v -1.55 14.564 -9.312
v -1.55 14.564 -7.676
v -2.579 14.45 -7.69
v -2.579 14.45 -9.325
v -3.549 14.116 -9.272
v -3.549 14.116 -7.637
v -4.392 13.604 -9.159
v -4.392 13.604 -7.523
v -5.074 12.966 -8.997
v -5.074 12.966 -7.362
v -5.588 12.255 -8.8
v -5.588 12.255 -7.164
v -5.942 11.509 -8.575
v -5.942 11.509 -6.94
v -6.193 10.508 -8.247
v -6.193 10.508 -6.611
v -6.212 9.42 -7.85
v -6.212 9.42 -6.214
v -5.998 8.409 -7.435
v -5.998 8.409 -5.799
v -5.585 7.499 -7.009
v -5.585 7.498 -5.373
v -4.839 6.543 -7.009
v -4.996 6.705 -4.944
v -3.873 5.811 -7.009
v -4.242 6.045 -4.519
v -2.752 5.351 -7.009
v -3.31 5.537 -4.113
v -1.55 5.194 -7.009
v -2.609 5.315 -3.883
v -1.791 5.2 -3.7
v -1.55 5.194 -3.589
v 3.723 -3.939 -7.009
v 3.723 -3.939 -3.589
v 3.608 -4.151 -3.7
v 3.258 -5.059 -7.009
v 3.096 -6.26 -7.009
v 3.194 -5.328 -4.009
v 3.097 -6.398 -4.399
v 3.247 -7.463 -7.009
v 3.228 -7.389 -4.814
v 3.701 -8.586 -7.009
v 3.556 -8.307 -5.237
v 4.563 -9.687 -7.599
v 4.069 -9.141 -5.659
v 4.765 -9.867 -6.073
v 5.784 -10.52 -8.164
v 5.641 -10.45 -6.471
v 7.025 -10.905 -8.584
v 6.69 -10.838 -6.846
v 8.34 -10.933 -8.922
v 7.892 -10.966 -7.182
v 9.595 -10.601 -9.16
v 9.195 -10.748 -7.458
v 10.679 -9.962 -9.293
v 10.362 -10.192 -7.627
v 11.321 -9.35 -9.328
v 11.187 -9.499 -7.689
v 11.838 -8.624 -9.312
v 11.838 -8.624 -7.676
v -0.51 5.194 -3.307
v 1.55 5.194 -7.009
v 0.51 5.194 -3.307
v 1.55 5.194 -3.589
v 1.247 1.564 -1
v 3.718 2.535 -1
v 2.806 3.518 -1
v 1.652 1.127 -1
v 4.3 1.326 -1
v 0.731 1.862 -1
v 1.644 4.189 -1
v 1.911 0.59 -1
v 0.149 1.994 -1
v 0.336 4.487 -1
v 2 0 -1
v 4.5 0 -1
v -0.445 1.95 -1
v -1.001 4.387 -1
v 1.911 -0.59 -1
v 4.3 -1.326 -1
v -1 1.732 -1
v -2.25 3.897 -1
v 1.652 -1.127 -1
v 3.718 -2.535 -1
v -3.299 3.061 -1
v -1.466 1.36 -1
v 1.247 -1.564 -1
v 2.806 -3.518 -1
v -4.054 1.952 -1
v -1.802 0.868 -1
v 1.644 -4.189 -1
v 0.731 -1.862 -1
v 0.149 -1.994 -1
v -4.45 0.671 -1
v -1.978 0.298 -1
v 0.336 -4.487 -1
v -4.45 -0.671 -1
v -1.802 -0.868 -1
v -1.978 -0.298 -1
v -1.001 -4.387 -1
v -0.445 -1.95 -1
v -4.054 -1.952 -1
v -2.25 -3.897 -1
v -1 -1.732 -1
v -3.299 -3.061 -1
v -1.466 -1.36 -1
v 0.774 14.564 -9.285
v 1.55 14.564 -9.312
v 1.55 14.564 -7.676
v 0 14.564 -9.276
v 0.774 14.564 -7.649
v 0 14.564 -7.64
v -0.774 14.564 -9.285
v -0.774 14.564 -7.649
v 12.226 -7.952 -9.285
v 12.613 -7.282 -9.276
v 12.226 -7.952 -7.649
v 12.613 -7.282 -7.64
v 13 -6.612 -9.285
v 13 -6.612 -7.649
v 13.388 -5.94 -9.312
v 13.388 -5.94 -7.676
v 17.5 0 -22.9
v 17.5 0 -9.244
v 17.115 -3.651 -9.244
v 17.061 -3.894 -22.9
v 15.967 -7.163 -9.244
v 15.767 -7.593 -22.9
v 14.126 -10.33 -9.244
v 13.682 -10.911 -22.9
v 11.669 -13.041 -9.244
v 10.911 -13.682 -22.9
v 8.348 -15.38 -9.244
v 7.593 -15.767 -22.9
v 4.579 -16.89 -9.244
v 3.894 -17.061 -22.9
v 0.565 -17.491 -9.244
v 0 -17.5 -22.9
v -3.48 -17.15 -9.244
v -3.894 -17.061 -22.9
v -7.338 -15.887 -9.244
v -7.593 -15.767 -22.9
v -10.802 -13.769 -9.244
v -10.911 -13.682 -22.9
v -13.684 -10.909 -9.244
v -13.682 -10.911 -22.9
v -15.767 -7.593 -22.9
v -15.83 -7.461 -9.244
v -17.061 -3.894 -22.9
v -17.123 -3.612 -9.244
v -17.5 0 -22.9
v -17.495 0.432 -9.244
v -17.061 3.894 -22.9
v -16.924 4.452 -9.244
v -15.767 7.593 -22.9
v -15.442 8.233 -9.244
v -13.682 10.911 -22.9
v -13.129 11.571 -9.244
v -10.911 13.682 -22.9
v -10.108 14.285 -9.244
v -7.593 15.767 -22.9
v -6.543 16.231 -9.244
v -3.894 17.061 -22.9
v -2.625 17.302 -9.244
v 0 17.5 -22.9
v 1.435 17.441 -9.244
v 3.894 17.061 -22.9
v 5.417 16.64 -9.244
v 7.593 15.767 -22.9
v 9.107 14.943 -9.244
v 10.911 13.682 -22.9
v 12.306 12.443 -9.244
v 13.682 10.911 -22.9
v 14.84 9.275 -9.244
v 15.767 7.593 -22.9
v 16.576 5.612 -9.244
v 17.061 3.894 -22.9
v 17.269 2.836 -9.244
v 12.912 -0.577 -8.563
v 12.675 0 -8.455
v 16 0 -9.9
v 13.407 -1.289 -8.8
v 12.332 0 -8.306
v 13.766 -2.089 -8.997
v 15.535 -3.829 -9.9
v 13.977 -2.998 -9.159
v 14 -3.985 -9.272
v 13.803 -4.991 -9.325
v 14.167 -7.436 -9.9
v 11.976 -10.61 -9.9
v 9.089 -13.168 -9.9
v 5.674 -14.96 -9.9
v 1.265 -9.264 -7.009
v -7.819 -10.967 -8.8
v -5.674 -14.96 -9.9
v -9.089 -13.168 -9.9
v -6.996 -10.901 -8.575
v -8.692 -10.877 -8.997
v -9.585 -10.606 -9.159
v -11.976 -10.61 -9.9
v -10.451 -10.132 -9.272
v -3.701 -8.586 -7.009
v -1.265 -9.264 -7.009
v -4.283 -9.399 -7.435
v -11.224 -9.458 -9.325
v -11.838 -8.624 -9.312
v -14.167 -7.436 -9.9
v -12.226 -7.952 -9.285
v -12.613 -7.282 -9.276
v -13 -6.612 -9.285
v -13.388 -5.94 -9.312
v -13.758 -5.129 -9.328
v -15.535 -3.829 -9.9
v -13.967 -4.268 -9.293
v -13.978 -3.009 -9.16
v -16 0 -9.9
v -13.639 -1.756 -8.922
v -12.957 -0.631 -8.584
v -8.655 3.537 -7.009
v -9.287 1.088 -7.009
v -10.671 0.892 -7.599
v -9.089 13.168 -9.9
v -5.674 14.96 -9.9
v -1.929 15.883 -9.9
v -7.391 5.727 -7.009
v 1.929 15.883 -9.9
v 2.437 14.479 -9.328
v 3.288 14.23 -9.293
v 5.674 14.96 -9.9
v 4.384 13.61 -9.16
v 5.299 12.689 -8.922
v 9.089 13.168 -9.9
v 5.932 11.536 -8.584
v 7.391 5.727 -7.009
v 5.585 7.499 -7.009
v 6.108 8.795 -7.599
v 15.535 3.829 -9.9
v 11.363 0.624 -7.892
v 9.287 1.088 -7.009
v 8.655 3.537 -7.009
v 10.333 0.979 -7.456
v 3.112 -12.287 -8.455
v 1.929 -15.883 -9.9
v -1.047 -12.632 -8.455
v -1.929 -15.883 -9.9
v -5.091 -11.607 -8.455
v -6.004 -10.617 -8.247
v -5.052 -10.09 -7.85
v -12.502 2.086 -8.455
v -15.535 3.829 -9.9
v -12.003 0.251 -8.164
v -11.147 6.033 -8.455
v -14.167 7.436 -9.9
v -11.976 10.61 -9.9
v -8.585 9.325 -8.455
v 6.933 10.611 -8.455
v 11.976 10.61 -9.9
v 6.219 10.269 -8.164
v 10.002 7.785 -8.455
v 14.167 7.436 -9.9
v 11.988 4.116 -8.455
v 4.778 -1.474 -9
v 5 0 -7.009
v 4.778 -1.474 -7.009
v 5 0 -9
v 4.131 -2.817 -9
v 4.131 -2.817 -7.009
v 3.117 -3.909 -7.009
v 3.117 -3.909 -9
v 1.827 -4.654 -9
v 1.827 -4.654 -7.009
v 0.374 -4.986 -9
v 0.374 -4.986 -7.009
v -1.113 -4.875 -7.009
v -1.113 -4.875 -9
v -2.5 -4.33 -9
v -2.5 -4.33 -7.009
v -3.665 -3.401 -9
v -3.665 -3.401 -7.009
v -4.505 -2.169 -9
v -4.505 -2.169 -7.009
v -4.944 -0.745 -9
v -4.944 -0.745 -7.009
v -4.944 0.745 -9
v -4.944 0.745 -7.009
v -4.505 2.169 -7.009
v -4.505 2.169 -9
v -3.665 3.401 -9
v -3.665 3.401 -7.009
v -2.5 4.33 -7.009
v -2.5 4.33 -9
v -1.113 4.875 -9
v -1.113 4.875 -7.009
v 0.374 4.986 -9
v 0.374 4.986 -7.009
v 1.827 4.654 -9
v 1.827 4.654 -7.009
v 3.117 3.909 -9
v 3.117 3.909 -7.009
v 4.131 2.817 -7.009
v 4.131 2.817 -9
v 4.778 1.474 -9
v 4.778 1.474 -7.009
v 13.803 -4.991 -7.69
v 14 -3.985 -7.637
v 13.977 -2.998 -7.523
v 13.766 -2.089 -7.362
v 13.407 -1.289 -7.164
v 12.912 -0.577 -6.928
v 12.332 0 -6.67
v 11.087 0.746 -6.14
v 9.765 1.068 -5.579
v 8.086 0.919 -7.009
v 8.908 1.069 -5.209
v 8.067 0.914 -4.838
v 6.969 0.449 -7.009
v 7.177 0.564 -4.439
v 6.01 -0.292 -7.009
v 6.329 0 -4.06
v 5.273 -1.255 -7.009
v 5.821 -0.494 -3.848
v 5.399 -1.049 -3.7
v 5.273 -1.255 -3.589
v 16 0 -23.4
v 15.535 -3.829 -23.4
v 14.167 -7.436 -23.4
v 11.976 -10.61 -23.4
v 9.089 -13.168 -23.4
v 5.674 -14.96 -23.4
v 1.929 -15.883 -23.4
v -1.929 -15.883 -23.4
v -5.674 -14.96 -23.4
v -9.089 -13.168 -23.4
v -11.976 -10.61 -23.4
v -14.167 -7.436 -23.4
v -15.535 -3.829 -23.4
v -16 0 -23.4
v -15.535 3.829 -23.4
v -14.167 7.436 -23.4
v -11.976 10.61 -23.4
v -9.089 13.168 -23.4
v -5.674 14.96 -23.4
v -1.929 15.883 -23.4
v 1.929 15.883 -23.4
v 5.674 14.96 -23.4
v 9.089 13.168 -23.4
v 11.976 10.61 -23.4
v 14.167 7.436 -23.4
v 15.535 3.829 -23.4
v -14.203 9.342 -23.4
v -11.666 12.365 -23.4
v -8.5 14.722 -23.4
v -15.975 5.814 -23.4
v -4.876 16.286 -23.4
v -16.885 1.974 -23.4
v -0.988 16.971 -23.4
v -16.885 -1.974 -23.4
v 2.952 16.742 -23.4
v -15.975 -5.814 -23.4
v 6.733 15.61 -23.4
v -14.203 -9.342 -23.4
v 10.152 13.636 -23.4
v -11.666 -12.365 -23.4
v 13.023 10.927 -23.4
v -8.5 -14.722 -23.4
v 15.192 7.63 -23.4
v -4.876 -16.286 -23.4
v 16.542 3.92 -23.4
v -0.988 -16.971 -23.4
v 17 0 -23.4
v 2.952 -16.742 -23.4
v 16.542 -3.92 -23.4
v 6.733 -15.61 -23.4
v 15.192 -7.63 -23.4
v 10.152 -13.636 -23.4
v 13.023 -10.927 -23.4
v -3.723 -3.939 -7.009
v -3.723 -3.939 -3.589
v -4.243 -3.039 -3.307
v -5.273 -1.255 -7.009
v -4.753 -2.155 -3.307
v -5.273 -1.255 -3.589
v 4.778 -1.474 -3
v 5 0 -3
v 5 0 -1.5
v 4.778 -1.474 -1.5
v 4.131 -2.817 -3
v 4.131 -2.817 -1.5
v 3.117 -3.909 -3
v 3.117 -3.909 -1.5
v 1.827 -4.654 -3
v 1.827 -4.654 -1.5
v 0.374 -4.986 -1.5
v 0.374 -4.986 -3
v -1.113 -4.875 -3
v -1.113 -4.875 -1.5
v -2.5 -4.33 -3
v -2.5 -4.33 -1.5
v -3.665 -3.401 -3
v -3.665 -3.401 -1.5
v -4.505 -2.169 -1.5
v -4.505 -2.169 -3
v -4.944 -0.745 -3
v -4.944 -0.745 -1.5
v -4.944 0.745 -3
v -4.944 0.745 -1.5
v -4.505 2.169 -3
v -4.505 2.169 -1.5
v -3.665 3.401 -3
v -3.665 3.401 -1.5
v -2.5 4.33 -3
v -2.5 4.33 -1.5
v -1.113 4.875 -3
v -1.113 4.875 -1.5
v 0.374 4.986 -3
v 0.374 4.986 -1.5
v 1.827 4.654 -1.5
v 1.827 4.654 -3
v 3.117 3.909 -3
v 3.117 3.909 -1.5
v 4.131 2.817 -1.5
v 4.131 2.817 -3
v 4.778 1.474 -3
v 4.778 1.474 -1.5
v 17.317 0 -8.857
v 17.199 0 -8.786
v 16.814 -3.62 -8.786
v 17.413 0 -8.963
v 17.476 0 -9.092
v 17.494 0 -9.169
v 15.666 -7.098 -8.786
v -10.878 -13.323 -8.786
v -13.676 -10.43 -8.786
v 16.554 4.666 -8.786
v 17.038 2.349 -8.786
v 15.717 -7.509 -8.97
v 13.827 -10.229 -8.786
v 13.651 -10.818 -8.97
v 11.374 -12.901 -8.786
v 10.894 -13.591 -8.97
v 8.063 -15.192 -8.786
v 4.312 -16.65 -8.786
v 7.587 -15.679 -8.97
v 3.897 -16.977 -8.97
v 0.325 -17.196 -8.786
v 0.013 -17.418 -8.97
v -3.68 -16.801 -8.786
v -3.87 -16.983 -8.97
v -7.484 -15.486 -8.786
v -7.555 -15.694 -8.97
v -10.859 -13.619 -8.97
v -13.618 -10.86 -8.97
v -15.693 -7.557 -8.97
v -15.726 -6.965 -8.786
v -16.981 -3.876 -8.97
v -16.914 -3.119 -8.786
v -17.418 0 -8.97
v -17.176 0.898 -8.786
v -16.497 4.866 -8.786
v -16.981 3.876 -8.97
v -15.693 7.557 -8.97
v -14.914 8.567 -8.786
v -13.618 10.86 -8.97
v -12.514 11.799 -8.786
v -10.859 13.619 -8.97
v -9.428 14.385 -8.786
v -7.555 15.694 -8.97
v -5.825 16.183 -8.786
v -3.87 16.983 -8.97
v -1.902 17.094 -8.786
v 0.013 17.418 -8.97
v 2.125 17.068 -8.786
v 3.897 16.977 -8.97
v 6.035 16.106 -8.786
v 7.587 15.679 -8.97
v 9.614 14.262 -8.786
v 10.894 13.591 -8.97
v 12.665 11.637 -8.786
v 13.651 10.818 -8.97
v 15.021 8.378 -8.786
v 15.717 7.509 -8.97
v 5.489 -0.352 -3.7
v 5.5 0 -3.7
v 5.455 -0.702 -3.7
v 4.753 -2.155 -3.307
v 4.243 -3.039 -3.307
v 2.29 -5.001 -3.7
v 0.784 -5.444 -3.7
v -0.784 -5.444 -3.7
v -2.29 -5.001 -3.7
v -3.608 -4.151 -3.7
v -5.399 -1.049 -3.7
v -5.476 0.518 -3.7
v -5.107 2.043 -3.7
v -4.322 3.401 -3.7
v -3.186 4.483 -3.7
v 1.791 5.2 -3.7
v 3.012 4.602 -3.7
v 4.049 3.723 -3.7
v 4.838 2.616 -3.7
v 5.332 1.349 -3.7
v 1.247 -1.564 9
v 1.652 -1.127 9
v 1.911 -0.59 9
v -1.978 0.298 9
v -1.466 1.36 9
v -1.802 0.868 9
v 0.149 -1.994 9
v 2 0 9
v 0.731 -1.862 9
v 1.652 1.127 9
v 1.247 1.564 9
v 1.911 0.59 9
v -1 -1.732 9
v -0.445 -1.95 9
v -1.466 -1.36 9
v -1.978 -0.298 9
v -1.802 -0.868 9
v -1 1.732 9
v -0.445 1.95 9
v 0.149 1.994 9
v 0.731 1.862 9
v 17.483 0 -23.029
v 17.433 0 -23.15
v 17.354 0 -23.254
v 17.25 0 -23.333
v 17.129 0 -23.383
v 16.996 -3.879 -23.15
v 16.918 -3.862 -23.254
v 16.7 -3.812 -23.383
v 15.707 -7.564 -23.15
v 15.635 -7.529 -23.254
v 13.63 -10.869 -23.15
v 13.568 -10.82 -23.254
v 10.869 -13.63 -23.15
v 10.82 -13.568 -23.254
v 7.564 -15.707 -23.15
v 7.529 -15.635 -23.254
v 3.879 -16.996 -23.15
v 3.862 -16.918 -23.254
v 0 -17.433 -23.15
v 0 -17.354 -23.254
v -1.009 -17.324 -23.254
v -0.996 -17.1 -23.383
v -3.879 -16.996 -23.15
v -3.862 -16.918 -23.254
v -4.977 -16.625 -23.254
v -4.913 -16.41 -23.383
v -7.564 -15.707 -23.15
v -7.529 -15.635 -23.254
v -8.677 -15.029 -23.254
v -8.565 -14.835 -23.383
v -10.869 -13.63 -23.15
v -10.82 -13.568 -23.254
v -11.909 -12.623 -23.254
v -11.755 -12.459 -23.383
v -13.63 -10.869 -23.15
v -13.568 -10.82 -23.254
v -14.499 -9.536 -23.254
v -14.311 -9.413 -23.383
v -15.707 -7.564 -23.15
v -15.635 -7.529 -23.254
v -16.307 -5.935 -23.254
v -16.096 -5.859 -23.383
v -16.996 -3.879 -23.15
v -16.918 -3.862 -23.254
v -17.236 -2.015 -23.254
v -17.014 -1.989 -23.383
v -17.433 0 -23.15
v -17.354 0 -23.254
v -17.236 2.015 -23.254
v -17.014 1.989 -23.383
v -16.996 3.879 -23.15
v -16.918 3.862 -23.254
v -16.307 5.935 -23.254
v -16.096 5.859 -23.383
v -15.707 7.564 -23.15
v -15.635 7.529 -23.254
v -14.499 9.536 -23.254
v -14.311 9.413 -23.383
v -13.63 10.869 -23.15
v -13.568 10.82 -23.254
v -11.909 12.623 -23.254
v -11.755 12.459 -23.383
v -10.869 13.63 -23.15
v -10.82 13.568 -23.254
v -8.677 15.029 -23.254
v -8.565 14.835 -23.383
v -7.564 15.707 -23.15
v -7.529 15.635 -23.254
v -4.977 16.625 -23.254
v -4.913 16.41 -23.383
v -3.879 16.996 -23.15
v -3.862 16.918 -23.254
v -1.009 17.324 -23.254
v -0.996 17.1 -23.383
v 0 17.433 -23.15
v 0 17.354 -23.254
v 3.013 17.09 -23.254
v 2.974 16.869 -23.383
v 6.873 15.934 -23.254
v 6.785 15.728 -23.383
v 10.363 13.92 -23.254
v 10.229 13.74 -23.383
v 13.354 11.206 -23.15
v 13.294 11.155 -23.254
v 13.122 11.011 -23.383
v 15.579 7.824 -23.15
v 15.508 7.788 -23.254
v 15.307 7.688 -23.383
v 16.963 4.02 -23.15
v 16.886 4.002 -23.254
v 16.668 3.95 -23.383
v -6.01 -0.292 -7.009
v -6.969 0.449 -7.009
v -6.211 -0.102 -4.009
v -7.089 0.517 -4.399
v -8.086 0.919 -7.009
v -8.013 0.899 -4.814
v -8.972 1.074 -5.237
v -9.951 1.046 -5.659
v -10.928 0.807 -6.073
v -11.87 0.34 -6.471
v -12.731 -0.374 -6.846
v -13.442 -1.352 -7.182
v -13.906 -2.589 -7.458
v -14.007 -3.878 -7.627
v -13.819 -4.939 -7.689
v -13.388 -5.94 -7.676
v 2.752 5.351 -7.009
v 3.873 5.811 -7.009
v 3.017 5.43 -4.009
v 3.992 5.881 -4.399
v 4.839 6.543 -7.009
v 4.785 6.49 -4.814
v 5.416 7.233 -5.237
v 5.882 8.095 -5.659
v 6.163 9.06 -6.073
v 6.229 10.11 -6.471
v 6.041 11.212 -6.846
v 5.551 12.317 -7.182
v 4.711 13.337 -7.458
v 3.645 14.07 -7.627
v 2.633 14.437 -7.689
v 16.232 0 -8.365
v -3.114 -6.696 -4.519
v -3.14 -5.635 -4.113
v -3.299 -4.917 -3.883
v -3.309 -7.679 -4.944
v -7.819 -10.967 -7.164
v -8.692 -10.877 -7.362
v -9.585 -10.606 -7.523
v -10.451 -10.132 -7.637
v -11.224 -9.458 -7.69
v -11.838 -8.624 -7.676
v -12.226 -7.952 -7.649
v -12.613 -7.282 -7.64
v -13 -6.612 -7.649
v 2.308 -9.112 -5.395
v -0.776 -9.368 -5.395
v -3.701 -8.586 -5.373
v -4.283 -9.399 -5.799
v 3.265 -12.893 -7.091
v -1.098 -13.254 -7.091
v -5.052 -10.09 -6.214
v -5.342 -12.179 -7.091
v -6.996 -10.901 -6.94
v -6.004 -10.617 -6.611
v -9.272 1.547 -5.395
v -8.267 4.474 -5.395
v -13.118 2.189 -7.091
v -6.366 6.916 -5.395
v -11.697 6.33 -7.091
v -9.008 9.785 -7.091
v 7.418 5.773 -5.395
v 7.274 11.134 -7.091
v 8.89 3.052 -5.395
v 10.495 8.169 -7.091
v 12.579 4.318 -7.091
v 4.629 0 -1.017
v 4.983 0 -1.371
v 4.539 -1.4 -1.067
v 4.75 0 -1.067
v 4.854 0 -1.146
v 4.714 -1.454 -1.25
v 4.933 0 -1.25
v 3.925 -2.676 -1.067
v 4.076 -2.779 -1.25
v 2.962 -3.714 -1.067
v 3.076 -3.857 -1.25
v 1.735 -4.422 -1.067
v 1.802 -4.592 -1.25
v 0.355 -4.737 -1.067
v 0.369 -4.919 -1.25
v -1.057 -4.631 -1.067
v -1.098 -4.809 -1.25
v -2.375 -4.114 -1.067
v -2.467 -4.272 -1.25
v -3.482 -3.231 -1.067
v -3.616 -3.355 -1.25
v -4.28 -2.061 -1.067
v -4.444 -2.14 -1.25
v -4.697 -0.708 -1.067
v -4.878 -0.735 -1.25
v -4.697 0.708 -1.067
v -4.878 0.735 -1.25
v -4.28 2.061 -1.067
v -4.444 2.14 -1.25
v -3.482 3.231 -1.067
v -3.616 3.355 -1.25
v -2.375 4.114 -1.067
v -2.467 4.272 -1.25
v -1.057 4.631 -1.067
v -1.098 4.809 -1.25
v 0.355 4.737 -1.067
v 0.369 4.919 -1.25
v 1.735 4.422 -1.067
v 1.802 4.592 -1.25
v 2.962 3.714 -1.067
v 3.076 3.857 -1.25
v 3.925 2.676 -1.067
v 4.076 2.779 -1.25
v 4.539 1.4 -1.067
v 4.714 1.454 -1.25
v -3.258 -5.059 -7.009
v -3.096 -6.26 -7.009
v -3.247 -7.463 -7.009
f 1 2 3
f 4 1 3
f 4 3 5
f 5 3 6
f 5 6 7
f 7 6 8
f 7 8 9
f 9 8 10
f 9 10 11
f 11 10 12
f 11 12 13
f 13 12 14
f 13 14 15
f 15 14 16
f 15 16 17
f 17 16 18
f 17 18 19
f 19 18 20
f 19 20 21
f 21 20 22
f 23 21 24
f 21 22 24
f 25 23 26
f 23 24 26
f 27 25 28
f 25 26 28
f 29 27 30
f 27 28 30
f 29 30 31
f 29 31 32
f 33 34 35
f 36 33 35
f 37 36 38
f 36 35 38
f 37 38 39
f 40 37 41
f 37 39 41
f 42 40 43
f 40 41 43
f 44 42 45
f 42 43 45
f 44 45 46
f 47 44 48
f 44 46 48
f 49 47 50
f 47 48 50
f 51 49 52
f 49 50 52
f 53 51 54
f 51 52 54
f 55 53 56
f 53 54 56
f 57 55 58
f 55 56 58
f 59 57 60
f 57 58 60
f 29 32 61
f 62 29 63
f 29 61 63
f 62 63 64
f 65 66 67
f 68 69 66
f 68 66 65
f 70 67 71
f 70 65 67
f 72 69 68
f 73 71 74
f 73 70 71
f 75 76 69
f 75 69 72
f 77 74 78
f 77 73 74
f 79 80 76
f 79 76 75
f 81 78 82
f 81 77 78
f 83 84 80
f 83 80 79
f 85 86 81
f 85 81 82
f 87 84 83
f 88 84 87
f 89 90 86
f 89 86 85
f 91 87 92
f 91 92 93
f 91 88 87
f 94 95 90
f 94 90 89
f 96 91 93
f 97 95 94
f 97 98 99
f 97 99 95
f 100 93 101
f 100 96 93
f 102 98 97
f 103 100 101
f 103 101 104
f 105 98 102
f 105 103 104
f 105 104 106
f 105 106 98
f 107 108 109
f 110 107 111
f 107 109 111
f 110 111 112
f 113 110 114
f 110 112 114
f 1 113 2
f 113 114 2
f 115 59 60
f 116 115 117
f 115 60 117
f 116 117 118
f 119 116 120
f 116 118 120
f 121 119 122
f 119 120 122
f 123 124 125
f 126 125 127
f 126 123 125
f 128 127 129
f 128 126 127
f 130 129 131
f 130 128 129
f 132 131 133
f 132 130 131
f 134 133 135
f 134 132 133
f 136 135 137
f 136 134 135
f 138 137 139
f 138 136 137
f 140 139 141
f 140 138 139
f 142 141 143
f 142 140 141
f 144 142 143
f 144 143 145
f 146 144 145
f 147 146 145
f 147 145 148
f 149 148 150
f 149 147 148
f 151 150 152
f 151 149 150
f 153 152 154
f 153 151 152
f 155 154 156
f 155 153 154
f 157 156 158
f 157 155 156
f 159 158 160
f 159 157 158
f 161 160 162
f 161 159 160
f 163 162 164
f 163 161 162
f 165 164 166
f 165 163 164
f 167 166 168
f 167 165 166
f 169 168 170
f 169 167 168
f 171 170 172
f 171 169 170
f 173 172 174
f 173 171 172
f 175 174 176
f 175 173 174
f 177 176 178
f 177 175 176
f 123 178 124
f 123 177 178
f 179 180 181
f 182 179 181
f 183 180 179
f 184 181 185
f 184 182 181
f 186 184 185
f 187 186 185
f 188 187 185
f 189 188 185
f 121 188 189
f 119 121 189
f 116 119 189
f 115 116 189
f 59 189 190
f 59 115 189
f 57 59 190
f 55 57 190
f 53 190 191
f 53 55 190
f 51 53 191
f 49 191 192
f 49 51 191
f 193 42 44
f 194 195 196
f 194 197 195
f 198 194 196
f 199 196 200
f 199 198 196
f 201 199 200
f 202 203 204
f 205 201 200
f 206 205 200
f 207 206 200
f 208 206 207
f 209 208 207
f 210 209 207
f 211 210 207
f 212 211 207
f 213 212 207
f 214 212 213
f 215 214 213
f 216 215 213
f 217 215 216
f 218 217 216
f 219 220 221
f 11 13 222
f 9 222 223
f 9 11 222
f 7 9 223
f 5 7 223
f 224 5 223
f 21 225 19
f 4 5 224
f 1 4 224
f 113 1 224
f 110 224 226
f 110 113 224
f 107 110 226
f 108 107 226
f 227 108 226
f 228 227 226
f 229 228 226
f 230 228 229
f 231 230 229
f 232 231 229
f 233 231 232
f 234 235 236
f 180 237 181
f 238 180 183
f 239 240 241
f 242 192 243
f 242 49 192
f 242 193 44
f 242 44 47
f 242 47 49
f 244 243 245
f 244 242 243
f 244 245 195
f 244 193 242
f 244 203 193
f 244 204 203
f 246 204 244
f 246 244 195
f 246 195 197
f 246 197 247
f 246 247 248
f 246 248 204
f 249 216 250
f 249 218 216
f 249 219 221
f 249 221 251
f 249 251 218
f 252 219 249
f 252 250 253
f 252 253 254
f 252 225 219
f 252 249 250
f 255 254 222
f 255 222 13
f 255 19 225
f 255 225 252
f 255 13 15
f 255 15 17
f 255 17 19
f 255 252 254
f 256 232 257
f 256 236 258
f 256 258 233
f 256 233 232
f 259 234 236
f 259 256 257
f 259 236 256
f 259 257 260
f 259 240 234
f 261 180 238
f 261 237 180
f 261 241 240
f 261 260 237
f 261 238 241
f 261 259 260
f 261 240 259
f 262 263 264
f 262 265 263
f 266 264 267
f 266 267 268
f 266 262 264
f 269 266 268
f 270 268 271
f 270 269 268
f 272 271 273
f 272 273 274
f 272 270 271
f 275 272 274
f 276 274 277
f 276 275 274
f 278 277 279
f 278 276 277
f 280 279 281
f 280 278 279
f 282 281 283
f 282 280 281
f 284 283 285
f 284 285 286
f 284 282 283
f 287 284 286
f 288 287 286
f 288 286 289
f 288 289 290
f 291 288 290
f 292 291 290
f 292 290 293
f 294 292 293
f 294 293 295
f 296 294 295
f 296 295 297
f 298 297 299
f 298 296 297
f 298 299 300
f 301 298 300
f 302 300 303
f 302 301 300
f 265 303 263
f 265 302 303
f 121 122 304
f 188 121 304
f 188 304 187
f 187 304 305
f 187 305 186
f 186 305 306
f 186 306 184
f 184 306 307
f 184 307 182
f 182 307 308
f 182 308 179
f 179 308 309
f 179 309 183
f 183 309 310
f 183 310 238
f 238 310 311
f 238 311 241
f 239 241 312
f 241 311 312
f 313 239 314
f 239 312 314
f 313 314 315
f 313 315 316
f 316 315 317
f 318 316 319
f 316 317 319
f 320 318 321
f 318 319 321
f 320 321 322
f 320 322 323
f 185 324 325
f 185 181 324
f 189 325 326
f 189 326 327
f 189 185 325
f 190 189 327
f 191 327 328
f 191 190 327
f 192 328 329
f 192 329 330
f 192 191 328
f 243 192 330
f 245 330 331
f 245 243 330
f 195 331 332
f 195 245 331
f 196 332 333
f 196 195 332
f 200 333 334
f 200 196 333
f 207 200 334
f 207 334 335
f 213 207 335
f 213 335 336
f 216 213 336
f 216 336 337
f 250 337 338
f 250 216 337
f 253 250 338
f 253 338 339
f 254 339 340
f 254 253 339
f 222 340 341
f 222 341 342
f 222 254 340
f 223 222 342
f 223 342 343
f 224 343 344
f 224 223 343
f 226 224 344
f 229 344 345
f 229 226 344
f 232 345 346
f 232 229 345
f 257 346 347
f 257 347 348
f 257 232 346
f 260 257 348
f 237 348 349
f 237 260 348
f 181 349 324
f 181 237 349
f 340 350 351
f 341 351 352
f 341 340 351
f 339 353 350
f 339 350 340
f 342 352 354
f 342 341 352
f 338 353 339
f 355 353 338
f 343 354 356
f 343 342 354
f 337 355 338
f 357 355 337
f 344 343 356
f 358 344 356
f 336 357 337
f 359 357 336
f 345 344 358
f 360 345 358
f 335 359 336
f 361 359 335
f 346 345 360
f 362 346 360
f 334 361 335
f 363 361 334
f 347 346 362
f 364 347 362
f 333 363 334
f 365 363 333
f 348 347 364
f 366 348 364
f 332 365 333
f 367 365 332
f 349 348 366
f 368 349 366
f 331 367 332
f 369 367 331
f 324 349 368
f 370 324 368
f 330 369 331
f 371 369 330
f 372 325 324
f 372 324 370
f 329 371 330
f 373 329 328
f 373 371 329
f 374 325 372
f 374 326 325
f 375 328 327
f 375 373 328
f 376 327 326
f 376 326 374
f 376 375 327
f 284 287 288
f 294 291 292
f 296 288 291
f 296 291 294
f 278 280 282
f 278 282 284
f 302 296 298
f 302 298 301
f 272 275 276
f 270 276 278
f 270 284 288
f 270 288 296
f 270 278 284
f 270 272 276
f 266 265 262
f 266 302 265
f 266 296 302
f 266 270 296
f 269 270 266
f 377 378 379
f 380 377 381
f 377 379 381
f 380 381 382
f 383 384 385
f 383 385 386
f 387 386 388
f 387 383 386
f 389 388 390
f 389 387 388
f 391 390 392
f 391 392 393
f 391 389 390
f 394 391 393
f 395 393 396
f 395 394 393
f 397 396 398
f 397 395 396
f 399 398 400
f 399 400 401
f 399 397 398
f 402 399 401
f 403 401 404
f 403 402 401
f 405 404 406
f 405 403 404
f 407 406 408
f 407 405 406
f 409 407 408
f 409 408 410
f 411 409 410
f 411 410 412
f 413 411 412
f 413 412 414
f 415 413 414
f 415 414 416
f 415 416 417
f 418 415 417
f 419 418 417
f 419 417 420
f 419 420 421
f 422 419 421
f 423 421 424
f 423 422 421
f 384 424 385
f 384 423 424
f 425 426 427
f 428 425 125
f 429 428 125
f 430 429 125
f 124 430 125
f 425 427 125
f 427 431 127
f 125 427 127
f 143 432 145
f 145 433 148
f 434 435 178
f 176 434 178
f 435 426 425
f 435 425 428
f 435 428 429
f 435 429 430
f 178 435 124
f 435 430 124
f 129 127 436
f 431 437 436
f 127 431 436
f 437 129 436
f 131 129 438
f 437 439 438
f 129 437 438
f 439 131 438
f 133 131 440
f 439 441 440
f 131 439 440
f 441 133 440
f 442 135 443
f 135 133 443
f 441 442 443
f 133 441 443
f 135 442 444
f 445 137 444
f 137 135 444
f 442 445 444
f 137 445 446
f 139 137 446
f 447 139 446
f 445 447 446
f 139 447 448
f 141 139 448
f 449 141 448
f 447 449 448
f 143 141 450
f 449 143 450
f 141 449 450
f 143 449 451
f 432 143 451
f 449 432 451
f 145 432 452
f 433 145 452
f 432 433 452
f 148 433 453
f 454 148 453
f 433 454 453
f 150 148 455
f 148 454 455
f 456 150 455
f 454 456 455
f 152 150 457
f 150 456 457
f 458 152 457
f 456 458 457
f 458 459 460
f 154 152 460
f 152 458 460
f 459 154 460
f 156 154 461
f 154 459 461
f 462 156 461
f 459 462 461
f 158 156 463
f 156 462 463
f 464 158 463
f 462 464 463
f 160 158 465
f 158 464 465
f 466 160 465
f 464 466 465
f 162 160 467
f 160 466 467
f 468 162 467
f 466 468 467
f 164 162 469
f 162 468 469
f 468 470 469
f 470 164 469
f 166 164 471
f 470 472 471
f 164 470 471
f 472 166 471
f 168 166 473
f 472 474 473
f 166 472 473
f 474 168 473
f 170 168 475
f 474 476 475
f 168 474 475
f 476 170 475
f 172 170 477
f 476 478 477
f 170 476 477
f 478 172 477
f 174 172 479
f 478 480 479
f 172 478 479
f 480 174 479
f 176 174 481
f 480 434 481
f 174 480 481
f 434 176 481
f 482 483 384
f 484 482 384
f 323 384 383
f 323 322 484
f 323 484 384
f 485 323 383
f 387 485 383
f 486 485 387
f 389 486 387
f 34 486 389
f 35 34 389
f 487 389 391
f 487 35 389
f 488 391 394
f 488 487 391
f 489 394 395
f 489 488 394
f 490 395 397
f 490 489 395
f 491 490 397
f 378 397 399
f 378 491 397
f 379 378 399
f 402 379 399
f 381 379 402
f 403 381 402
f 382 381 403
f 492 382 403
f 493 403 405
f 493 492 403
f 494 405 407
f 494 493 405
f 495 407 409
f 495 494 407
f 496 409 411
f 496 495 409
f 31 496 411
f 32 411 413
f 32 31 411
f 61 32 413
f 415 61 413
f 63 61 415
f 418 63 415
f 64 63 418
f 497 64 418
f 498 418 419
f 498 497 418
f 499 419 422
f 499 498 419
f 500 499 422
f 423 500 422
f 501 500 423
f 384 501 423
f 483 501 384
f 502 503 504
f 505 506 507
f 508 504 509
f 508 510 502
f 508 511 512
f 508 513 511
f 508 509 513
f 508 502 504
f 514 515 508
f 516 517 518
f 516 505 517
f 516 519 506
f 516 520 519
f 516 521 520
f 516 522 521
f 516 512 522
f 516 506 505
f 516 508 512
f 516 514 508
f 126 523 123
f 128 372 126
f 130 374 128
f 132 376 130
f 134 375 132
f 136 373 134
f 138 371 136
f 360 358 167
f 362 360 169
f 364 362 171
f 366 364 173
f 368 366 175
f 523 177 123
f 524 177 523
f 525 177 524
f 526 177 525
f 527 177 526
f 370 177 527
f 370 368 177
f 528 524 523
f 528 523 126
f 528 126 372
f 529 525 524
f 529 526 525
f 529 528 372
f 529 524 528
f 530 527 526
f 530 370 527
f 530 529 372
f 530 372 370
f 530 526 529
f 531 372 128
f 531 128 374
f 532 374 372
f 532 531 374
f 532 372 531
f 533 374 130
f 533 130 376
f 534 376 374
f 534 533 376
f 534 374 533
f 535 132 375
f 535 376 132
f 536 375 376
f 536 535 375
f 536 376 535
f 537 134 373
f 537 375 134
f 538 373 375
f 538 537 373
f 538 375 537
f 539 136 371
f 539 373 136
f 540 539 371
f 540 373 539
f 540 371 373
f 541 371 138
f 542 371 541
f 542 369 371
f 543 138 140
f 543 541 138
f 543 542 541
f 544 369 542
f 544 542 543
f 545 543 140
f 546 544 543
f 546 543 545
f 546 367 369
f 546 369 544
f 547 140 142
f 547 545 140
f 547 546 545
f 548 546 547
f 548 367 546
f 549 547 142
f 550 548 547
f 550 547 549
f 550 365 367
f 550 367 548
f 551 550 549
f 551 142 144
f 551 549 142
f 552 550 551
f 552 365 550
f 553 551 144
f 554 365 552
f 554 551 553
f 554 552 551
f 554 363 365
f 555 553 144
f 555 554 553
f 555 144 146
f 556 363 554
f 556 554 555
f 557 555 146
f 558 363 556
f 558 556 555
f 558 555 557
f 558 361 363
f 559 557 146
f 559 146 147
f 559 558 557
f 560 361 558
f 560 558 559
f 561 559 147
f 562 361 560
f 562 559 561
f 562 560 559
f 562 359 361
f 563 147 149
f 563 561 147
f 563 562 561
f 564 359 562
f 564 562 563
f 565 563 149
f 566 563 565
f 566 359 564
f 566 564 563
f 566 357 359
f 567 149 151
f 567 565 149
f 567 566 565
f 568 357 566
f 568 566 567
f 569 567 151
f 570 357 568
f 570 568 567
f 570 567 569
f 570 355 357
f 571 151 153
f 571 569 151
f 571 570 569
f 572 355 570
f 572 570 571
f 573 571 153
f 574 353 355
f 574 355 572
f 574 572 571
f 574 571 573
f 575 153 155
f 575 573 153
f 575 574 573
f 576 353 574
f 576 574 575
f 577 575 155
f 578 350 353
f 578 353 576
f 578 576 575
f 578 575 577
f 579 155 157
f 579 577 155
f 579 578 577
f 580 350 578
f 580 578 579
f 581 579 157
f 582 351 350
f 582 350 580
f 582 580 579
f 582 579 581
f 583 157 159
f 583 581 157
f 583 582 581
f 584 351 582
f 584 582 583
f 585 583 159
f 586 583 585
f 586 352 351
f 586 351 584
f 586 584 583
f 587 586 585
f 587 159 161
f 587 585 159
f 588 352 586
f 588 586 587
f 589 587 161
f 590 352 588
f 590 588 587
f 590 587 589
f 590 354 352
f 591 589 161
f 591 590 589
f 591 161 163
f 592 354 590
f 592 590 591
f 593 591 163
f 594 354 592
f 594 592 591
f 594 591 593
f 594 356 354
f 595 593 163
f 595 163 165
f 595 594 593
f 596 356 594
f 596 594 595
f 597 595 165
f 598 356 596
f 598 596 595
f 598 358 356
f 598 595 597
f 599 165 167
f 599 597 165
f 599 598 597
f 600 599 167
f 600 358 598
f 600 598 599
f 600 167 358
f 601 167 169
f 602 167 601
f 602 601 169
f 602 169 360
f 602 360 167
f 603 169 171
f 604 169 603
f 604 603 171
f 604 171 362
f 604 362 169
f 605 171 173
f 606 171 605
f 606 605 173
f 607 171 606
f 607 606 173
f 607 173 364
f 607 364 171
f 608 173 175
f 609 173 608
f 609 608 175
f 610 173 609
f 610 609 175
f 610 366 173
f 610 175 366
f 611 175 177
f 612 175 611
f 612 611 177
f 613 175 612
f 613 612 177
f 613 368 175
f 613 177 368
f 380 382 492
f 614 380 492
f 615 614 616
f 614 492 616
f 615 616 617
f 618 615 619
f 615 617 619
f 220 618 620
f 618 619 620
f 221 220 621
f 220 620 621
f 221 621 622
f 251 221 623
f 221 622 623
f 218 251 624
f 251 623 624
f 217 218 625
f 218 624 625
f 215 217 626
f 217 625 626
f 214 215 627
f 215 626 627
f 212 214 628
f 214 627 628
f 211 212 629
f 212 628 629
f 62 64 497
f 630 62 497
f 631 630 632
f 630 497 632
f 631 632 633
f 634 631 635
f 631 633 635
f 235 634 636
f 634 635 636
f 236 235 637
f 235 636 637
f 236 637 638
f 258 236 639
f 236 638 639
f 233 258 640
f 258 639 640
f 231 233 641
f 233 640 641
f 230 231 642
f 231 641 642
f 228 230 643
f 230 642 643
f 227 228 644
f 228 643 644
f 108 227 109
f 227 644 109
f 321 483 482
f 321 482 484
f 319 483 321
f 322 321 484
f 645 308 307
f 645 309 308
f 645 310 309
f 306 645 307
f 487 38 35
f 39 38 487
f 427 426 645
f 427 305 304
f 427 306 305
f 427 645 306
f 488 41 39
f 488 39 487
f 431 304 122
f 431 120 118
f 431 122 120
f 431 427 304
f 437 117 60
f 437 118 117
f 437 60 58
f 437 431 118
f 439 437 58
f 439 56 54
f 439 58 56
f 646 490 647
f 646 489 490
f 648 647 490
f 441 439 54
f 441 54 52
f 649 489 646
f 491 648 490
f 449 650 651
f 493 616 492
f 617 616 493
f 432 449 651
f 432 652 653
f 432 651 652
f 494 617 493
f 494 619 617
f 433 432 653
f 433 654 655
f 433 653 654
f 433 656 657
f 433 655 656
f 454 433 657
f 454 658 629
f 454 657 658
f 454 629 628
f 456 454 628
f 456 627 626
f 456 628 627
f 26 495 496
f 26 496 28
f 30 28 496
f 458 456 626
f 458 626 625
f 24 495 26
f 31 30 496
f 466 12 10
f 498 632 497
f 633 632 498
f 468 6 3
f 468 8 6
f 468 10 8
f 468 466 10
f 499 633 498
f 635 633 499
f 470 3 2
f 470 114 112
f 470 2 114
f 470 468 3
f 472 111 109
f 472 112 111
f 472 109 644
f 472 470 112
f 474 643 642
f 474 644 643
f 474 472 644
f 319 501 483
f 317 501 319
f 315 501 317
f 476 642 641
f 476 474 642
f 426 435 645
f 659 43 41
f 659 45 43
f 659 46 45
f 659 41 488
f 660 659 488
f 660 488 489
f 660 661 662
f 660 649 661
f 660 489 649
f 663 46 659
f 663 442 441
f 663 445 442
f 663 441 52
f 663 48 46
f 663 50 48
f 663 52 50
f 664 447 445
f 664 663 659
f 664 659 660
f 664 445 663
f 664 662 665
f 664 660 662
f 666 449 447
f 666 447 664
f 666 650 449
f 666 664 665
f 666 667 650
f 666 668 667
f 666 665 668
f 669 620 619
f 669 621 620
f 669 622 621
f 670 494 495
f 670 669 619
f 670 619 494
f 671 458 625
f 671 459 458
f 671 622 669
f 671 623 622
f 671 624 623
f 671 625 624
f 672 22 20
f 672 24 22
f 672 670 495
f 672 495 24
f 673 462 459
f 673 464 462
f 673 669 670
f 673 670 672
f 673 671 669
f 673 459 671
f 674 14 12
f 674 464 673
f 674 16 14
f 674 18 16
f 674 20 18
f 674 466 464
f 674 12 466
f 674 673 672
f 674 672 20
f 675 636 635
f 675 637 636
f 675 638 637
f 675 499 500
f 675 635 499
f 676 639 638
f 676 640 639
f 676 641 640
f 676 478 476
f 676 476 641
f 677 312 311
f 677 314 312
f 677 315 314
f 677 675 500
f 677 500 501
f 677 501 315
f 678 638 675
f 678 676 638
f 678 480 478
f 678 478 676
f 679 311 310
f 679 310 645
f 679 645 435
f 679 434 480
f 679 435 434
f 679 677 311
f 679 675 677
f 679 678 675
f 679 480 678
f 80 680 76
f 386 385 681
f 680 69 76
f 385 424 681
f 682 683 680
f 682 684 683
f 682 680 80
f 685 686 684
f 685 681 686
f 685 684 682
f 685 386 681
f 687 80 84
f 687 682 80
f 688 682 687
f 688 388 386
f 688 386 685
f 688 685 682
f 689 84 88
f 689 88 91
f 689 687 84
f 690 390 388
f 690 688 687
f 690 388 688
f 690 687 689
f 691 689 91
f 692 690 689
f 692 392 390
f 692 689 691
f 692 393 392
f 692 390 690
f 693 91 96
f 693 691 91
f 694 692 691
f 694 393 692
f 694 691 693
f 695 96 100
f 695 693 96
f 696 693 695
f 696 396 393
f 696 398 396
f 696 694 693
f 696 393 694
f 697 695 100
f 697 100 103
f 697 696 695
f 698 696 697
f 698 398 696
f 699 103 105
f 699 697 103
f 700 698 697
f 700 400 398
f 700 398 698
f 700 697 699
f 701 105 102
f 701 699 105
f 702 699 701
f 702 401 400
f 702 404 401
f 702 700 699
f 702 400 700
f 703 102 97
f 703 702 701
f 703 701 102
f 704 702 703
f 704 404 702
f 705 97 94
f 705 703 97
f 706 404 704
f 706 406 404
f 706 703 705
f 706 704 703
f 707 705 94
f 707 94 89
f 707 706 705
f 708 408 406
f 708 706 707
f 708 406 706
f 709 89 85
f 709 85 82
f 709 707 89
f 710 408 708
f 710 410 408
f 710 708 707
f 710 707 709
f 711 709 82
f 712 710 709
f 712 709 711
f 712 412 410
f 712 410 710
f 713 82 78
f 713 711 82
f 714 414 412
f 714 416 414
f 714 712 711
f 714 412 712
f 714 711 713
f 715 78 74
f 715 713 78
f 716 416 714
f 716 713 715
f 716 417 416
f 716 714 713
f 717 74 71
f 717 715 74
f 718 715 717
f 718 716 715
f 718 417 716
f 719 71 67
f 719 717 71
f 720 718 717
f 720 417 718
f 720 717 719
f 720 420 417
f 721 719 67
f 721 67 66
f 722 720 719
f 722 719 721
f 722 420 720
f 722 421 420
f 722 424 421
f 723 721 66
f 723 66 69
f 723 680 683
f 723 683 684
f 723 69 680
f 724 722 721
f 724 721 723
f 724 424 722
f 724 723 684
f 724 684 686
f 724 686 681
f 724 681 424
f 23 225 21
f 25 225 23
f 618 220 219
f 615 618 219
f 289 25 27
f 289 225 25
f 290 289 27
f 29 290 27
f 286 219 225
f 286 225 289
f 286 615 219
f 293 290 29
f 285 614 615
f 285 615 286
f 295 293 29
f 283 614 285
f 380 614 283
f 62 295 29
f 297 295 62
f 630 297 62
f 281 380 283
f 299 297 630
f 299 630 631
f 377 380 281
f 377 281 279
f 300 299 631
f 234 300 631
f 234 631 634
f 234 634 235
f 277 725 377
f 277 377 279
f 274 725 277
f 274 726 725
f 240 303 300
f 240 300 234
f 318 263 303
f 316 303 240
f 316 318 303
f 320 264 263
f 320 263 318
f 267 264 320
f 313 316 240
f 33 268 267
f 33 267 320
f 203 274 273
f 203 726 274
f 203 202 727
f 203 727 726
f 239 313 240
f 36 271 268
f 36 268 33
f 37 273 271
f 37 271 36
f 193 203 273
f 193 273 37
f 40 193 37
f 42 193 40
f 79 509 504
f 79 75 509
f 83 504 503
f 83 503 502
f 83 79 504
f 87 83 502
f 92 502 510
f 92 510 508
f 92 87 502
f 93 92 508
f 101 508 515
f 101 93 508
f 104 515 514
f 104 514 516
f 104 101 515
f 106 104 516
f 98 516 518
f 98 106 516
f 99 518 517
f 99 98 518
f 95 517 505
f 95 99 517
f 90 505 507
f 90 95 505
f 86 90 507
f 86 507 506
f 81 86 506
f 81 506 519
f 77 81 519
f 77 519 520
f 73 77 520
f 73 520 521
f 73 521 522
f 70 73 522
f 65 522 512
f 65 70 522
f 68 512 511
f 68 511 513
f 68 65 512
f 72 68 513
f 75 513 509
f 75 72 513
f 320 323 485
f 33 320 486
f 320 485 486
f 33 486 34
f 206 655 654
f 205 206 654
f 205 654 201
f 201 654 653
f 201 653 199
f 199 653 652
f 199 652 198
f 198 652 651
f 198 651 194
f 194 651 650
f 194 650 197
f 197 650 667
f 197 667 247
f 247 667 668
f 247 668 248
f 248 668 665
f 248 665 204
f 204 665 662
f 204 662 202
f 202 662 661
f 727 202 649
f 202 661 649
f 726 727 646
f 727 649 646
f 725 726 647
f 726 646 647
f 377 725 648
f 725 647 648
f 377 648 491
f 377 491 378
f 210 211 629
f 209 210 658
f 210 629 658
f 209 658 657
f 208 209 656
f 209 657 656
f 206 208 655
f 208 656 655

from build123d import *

# Parameters (mm, degrees)
CUT_EXTRUDE_1_DEPTH      = 10
PATTERN_CIRCULAR_1_COUNT = 3
FILLET_1_R               = 0.5


with BuildPart() as part:
    # Эскиз1 → Повернуть1 (revolve)
    with BuildSketch(Plane(origin=(0, 0, 0), x_dir=(0, 0, -1), z_dir=(1, 0, 0)), mode=Mode.PRIVATE) as revolve_1_sk:
        Polygon((-9, 0), (-9, 2), (1, 2), (1, 5), (3, 5), (3.7, 5.5), (8.916460066, 17.5), (23.4, 17.5), (23.4, 16), (9.9, 16), (7.009211714, 9.35), (7.009211714, 5), (9, 5), (9, 0), align=None)
    revolve(revolve_1_sk.sketch.rotate(Axis((0, 0, -9), (0, 0, -1)), 90), axis=Axis((0, 0, -9), (0, 0, -1)))

    # Эскиз2 → Вырез-Вытянуть1 (cut)
    with BuildSketch(Plane.XY.offset(-1)):
        with BuildLine():
            Line((1.55, 14.5641447), (-1.55, 14.5641447))
            ThreePointArc((-1.55, 14.5641447), (-6.235, 9.8791447), (-1.55, 5.1941447))
            Line((-1.55, 5.1941447), (1.55, 5.1941447))
            ThreePointArc((1.55, 5.1941447), (6.235, 9.8791447), (1.55, 14.5641447))
        make_face()
    cut_extrude_1 = extrude(amount=-CUT_EXTRUDE_1_DEPTH, mode=Mode.SUBTRACT)

    # Круговой массив1: Вырез-Вытянуть1 ×3 about axis
    pattern_circular_1_axis = Axis((0, 0, 0), (0, 0, 1))
    for i in range(1, PATTERN_CIRCULAR_1_COUNT):
        add(cut_extrude_1.rotate(pattern_circular_1_axis, i * 360 / PATTERN_CIRCULAR_1_COUNT), mode=Mode.SUBTRACT)

    # Скругление1
    fillet_1_edges = [part.edges().sort_by_distance(p)[0] for p in [
        (-17.5, 0, -23.4),
        (-17.5, 0, -8.916460066),
        (-5, 0, -1),
    ]]
    fillet(fillet_1_edges, radius=FILLET_1_R)


solid = part.part
